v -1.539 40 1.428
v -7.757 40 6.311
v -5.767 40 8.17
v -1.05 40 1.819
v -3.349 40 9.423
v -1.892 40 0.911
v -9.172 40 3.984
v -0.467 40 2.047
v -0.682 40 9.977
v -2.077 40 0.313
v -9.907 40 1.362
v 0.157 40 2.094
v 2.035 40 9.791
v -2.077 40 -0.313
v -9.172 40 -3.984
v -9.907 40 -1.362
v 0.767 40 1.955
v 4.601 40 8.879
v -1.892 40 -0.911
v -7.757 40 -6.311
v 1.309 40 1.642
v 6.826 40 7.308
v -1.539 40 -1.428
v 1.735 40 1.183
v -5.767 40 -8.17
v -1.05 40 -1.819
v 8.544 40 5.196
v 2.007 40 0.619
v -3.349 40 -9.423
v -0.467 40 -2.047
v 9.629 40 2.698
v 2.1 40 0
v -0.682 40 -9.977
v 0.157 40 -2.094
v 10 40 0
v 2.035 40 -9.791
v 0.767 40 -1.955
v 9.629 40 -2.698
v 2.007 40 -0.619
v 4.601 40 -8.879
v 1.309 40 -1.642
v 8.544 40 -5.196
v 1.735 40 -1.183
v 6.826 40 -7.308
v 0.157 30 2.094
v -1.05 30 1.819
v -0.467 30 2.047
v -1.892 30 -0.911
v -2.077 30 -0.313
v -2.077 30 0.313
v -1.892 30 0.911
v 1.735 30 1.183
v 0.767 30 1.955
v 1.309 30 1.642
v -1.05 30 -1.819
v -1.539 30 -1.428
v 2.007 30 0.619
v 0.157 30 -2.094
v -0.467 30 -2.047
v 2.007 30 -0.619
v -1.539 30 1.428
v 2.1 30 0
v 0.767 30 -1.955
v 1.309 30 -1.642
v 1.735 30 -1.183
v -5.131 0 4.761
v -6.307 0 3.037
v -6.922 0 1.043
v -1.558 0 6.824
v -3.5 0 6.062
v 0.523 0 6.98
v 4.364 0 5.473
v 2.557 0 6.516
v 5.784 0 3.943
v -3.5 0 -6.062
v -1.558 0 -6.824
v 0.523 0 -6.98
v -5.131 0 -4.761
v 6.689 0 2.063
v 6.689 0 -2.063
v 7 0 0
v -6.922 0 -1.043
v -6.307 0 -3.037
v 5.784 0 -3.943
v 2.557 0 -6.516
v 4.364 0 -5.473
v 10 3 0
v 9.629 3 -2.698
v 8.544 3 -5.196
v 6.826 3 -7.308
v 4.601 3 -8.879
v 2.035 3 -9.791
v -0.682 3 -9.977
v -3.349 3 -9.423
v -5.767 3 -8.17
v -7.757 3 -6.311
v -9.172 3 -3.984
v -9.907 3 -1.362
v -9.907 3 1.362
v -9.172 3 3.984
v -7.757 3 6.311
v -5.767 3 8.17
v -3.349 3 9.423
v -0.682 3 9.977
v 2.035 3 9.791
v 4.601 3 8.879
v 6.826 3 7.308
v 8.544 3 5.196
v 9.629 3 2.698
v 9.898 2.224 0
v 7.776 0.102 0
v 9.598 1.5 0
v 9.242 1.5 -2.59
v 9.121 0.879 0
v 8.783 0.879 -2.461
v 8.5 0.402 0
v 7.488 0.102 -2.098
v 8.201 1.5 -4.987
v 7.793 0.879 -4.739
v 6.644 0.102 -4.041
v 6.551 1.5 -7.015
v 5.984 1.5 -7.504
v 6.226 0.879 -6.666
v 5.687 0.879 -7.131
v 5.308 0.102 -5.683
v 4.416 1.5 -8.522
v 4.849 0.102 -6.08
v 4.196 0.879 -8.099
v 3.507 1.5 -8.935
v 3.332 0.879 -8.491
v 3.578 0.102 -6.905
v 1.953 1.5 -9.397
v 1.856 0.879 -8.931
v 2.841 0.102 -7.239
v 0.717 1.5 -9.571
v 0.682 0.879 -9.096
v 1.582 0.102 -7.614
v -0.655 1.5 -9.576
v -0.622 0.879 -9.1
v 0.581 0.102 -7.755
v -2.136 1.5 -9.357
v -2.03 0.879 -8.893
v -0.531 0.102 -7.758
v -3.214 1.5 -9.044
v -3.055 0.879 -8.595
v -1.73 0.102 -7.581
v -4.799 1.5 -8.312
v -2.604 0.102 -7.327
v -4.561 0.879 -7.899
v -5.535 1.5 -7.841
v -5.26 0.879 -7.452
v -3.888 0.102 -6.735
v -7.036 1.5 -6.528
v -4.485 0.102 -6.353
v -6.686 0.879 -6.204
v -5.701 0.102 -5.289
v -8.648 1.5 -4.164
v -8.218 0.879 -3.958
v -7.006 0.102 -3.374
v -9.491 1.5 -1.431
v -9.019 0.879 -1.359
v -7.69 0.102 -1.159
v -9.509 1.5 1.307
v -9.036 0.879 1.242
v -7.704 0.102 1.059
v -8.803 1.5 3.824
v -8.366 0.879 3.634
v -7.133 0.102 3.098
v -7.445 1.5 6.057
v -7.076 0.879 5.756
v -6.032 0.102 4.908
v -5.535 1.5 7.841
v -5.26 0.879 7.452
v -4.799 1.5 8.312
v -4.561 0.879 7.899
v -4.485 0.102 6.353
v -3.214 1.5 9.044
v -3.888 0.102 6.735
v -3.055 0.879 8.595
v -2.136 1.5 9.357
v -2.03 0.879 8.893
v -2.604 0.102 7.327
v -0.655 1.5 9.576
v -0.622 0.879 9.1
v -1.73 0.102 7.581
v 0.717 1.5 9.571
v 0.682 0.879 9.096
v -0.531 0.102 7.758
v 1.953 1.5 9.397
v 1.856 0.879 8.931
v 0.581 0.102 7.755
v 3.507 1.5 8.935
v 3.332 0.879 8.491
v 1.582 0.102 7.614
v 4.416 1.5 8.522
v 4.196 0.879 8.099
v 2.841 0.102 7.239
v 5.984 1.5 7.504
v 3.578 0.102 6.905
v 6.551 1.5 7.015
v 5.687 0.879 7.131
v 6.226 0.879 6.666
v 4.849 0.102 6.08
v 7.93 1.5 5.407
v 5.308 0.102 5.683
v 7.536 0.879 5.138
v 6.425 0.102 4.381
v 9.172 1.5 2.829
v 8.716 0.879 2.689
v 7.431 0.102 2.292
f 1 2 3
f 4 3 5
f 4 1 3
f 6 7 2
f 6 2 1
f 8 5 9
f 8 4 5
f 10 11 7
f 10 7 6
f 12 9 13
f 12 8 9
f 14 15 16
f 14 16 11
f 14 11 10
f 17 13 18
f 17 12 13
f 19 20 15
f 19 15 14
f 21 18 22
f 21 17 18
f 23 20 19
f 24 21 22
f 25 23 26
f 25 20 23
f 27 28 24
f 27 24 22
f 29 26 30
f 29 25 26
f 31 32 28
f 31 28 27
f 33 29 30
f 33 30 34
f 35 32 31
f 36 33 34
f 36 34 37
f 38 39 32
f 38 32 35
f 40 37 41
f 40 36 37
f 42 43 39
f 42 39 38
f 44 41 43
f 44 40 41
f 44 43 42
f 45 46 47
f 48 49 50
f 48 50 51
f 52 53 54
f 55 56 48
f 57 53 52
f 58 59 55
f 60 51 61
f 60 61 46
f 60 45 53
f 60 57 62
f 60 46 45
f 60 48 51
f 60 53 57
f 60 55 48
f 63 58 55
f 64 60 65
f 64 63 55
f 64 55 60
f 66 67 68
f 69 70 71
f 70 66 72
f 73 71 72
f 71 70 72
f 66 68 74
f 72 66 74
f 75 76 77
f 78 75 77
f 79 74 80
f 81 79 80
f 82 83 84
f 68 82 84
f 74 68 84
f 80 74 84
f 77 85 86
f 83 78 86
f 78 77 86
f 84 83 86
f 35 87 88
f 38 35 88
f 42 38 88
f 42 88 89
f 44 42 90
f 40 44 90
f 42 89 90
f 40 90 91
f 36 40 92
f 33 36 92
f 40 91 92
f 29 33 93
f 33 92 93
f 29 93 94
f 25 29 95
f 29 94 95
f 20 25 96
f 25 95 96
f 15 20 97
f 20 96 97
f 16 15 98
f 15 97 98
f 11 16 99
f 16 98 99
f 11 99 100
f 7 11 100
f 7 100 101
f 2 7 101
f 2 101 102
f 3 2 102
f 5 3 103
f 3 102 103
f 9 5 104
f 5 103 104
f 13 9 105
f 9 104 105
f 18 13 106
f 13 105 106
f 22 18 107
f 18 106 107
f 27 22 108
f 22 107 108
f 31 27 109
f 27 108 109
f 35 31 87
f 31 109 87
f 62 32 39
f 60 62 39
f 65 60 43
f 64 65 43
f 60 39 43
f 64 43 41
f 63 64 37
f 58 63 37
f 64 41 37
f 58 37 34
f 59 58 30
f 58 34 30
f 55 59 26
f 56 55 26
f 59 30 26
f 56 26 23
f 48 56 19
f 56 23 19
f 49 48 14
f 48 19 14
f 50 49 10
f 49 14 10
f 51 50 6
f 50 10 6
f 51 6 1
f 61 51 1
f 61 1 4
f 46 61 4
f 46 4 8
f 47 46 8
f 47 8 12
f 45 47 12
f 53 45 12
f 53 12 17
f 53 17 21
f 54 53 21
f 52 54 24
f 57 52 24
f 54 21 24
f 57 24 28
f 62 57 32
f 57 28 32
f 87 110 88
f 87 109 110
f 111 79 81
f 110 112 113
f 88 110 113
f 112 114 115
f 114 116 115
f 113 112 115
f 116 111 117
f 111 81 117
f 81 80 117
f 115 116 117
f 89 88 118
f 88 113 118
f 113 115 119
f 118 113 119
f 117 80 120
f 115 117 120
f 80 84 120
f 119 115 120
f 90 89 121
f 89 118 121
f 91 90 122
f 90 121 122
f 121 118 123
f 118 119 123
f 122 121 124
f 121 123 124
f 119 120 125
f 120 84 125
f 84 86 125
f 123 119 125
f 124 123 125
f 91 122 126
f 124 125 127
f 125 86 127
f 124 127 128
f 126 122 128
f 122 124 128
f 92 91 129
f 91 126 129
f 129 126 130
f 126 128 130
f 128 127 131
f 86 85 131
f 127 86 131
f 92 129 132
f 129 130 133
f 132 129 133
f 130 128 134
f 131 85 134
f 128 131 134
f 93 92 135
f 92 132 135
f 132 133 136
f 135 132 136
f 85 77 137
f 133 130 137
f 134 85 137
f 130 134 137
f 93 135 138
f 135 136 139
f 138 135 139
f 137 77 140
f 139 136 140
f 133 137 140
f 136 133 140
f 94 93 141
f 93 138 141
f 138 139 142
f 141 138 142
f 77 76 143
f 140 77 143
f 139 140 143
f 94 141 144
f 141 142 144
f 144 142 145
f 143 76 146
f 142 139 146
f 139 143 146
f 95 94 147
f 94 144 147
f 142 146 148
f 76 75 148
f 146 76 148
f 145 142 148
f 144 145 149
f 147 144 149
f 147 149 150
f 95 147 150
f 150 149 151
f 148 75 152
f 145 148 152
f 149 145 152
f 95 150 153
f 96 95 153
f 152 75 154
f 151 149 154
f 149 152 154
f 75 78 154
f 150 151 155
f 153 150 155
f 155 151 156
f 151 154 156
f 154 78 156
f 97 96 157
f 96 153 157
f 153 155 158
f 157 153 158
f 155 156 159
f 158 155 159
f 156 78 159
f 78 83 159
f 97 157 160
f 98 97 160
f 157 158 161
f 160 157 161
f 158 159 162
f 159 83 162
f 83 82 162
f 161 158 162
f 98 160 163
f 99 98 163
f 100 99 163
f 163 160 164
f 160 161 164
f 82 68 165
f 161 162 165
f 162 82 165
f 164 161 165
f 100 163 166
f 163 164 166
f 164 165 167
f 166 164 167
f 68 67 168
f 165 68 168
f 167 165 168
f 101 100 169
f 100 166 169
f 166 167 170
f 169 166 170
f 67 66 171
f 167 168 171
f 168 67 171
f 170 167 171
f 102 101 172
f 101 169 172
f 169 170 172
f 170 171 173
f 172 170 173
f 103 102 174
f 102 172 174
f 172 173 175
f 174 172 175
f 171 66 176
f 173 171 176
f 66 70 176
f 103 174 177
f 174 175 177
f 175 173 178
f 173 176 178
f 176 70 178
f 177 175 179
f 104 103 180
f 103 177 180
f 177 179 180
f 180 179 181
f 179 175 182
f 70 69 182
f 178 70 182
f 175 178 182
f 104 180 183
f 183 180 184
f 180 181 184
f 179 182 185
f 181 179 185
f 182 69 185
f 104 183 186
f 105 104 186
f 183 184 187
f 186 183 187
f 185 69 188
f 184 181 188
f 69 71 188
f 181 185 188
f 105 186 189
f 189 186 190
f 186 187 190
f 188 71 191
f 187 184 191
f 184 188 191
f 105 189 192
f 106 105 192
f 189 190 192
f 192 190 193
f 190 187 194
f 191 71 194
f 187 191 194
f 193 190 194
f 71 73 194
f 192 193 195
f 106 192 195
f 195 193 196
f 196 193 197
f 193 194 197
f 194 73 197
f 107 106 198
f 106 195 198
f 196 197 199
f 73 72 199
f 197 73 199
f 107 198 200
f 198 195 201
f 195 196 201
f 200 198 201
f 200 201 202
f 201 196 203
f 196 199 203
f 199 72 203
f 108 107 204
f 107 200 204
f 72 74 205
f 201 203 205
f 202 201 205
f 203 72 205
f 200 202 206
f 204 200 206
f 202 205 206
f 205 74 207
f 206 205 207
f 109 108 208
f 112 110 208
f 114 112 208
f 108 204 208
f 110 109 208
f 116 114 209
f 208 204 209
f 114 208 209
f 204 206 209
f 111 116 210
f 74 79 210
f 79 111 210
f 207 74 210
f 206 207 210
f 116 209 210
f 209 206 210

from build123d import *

# Parameters (mm, degrees)
SKETCH1_R           = 10
BOSS_EXTRUDE1_DEPTH = 40
FILLET1_R           = 3
SKETCH3_R           = 2.1
CUT_EXTRUDE1_DEPTH  = 10


with BuildPart() as part:
    # Sketch1 → Boss-Extrude1 (new body)
    with BuildSketch(Plane(origin=(0, 0, 0), x_dir=(1, 0, 0), z_dir=(0, 1, 0))):
        Circle(SKETCH1_R)
    extrude(amount=BOSS_EXTRUDE1_DEPTH)

    # Fillet1
    fillet1_edges = [part.edges().sort_by_distance(p)[0] for p in [
        (-10, 0, 0),
    ]]
    fillet(fillet1_edges, radius=FILLET1_R)

    # Sketch3 → Cut-Extrude1 (cut)
    with BuildSketch(Plane(origin=(0, 40, 0), x_dir=(1, 0, 0), z_dir=(0, 1, 0))):
        Circle(SKETCH3_R)
    extrude(amount=-CUT_EXTRUDE1_DEPTH, mode=Mode.SUBTRACT)


solid = part.part
